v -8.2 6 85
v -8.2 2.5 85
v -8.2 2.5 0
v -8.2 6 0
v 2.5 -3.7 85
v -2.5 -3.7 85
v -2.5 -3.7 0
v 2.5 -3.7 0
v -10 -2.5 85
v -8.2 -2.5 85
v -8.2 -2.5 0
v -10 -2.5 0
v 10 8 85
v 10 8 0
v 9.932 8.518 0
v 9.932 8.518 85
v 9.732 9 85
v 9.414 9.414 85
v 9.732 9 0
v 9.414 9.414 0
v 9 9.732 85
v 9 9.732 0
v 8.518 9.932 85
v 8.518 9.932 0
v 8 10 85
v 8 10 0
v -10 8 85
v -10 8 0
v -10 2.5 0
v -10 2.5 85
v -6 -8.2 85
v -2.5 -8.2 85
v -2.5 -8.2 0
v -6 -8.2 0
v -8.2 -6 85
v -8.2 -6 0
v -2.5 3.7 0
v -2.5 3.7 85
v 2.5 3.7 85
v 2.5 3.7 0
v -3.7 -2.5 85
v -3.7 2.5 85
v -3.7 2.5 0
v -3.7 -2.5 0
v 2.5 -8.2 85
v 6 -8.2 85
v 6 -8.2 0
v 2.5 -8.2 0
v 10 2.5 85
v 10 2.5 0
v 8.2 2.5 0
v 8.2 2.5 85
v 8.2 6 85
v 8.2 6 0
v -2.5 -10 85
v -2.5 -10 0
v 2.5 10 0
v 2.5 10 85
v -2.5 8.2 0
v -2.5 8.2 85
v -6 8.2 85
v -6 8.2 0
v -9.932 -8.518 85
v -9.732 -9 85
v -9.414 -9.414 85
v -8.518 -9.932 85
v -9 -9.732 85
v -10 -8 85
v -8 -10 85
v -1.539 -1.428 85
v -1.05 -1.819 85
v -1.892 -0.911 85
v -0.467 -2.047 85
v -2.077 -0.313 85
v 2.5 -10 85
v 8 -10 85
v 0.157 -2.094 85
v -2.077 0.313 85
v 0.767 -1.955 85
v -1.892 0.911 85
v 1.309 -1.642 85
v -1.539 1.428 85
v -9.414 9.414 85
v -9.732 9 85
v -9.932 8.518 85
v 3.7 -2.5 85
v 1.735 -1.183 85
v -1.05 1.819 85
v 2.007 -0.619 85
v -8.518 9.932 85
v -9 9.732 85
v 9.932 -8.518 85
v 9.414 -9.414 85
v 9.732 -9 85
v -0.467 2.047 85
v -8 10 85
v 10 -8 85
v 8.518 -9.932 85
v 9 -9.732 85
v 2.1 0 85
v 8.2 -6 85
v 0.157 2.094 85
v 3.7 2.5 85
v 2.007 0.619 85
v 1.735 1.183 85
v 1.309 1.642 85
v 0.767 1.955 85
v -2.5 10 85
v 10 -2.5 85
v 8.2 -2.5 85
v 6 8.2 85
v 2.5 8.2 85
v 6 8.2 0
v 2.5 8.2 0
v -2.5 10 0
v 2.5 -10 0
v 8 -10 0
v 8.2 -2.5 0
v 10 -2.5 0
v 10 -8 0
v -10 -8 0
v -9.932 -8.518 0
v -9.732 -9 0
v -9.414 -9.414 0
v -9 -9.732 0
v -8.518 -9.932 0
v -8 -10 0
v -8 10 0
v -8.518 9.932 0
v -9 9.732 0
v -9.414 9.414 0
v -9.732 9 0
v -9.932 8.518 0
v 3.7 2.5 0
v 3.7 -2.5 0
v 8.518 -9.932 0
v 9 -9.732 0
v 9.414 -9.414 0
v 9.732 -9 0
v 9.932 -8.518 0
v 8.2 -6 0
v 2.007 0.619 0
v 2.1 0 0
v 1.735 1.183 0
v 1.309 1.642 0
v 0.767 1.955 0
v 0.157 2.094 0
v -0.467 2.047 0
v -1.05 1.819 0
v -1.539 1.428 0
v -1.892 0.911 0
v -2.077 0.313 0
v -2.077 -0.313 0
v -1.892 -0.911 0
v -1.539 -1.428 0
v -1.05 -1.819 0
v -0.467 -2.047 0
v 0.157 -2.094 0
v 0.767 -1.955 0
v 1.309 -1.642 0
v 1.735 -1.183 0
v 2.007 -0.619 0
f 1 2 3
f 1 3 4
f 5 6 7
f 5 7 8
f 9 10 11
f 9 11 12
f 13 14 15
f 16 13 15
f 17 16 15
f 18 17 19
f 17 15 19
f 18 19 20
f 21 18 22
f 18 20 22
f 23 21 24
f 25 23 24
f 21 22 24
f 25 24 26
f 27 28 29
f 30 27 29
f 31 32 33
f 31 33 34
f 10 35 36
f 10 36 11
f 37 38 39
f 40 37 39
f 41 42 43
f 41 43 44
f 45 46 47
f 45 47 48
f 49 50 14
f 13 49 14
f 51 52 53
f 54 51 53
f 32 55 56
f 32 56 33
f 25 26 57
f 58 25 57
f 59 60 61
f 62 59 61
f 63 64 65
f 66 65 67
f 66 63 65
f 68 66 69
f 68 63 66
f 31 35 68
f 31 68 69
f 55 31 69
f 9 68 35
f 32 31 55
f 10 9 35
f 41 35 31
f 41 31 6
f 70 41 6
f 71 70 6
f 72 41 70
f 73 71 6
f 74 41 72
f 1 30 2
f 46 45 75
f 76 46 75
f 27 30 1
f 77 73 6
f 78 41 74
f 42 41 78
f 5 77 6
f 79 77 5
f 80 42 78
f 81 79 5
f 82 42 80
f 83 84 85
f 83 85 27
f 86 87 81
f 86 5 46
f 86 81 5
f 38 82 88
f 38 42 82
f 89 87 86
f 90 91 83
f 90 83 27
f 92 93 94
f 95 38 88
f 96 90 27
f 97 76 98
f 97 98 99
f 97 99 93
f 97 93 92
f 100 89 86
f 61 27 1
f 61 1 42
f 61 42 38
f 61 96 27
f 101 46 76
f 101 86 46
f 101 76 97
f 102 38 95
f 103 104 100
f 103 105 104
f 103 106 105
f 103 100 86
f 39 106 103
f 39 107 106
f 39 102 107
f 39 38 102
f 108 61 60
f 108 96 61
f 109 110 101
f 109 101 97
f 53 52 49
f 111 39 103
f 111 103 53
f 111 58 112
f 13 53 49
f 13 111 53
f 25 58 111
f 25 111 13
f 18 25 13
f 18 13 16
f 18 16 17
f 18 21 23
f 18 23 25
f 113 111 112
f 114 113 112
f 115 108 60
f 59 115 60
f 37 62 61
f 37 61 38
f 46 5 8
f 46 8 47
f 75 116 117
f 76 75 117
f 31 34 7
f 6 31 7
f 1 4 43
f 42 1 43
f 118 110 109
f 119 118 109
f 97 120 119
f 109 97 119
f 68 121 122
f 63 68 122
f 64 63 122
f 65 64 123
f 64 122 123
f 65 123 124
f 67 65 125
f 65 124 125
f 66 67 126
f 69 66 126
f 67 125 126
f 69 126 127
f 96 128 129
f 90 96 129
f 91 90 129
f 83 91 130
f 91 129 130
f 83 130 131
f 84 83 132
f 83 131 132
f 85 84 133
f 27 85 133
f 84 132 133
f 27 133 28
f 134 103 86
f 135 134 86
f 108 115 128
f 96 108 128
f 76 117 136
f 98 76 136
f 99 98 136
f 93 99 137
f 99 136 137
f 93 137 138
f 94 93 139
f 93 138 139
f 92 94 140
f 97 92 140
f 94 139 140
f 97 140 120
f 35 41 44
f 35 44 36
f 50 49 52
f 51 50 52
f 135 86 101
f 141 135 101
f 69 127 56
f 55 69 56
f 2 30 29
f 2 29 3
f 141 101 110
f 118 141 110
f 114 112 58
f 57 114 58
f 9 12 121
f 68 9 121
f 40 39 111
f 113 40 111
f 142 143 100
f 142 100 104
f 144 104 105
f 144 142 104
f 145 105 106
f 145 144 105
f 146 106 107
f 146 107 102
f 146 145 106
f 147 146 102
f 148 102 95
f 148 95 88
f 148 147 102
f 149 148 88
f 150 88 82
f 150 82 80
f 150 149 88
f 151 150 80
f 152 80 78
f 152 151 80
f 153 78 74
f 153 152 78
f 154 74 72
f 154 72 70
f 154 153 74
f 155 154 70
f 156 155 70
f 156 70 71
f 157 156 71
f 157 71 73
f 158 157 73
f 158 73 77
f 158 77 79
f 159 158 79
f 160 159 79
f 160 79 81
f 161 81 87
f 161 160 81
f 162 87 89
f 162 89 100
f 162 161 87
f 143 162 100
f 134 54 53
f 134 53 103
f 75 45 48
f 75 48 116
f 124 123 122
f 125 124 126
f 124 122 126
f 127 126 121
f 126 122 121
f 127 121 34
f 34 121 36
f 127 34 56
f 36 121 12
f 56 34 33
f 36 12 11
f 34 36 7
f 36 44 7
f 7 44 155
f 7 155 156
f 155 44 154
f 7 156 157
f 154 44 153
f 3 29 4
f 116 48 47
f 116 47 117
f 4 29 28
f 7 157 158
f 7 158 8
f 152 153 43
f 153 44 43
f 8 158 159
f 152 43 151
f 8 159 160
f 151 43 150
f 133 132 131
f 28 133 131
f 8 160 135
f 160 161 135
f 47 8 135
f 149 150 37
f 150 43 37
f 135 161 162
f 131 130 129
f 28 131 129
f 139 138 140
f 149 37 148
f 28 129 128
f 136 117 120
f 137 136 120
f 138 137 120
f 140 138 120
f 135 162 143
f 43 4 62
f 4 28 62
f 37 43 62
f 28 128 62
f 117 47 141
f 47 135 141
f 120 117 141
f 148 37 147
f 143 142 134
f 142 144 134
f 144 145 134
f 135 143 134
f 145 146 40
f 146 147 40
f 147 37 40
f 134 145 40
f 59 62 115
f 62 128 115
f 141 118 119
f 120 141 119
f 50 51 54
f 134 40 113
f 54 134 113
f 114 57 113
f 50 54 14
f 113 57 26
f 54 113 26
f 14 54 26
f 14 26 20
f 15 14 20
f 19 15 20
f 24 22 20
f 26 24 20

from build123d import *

# Parameters (mm, degrees)
EXTRUSION1_DEPTH        = 85
PER_AGE1_OUTLINE_R      = 2.1
PER_AGE1_DEPTH          = 85
ENL_V_MAT_EXTRU_1_DEPTH = 300
ENL_V_MAT_EXTRU_3_DEPTH = 300
ENL_V_MAT_EXTRU_4_DEPTH = 87.168439698
ENL_V_MAT_EXTRU_7_DEPTH = 87.168439698


# Read off the part's stored shape, not the designer's step: Perçage1
with BuildPart() as part:
    # Esquisse1 → Extrusion1 (new body)
    with BuildSketch(Plane.XY):
        with BuildLine():
            Line((-10, 8), (-10, -8))
            ThreePointArc((-10, -8), (-9.414213562, -9.414213562), (-8, -10))
            Line((-8, -10), (8, -10))
            ThreePointArc((8, -10), (9.414213562, -9.414213562), (10, -8))
            Line((10, -8), (10, 8))
            ThreePointArc((10, 8), (9.414213562, 9.414213562), (8, 10))
            Line((8, 10), (-8, 10))
            ThreePointArc((-8, 10), (-9.414213562, 9.414213562), (-10, 8))
        make_face()
    extrude(amount=EXTRUSION1_DEPTH)

    # Perçage1 outline → Perçage1 (cut)
    with BuildSketch(Plane.XY):
        Circle(PER_AGE1_OUTLINE_R)
    extrude(amount=PER_AGE1_DEPTH, mode=Mode.SUBTRACT)

    # Esquisse3 → Enlèv. mat.-Extru.1 (cut)
    with BuildSketch(Plane.XY.offset(85)):
        Polygon((10, 2.5), (8.2, 2.5), (8.2, 6), (3.7, 2.5), (3.7, -2.5), (8.2, -6), (8.2, -2.5), (10, -2.5), align=None)
    extrude(amount=-ENL_V_MAT_EXTRU_1_DEPTH, mode=Mode.SUBTRACT)

    # Esquisse5 → Enlèv. mat.-Extru.3 (cut)
    with BuildSketch(Plane.XY.offset(85)):
        Polygon((-2.5, 10), (-2.5, 8.2), (-6, 8.2), (-2.5, 3.7), (2.5, 3.7), (6, 8.2), (2.5, 8.2), (2.5, 10), align=None)
    extrude(amount=-ENL_V_MAT_EXTRU_3_DEPTH, mode=Mode.SUBTRACT)

    # Esquisse6 → Enlèv. mat.-Extru.4 (cut, through all)
    with BuildSketch(Plane.XY.offset(85)):
        Polygon((-2.5, -10), (-2.5, -8.2), (-6, -8.2), (-2.5, -3.7), (2.5, -3.7), (6, -8.2), (2.5, -8.2), (2.5, -10), align=None)
    extrude(amount=-ENL_V_MAT_EXTRU_4_DEPTH, mode=Mode.SUBTRACT)

    # Esquisse4 → Enlèv. mat.-Extru.7 (cut, through all)
    with BuildSketch(Plane.XY.offset(85)):
        Polygon((-10, 2.5), (-8.2, 2.5), (-8.2, 6), (-3.7, 2.5), (-3.7, -2.5), (-8.2, -6), (-8.2, -2.5), (-10, -2.5), align=None)
    extrude(amount=-ENL_V_MAT_EXTRU_7_DEPTH, mode=Mode.SUBTRACT)


solid = part.part
